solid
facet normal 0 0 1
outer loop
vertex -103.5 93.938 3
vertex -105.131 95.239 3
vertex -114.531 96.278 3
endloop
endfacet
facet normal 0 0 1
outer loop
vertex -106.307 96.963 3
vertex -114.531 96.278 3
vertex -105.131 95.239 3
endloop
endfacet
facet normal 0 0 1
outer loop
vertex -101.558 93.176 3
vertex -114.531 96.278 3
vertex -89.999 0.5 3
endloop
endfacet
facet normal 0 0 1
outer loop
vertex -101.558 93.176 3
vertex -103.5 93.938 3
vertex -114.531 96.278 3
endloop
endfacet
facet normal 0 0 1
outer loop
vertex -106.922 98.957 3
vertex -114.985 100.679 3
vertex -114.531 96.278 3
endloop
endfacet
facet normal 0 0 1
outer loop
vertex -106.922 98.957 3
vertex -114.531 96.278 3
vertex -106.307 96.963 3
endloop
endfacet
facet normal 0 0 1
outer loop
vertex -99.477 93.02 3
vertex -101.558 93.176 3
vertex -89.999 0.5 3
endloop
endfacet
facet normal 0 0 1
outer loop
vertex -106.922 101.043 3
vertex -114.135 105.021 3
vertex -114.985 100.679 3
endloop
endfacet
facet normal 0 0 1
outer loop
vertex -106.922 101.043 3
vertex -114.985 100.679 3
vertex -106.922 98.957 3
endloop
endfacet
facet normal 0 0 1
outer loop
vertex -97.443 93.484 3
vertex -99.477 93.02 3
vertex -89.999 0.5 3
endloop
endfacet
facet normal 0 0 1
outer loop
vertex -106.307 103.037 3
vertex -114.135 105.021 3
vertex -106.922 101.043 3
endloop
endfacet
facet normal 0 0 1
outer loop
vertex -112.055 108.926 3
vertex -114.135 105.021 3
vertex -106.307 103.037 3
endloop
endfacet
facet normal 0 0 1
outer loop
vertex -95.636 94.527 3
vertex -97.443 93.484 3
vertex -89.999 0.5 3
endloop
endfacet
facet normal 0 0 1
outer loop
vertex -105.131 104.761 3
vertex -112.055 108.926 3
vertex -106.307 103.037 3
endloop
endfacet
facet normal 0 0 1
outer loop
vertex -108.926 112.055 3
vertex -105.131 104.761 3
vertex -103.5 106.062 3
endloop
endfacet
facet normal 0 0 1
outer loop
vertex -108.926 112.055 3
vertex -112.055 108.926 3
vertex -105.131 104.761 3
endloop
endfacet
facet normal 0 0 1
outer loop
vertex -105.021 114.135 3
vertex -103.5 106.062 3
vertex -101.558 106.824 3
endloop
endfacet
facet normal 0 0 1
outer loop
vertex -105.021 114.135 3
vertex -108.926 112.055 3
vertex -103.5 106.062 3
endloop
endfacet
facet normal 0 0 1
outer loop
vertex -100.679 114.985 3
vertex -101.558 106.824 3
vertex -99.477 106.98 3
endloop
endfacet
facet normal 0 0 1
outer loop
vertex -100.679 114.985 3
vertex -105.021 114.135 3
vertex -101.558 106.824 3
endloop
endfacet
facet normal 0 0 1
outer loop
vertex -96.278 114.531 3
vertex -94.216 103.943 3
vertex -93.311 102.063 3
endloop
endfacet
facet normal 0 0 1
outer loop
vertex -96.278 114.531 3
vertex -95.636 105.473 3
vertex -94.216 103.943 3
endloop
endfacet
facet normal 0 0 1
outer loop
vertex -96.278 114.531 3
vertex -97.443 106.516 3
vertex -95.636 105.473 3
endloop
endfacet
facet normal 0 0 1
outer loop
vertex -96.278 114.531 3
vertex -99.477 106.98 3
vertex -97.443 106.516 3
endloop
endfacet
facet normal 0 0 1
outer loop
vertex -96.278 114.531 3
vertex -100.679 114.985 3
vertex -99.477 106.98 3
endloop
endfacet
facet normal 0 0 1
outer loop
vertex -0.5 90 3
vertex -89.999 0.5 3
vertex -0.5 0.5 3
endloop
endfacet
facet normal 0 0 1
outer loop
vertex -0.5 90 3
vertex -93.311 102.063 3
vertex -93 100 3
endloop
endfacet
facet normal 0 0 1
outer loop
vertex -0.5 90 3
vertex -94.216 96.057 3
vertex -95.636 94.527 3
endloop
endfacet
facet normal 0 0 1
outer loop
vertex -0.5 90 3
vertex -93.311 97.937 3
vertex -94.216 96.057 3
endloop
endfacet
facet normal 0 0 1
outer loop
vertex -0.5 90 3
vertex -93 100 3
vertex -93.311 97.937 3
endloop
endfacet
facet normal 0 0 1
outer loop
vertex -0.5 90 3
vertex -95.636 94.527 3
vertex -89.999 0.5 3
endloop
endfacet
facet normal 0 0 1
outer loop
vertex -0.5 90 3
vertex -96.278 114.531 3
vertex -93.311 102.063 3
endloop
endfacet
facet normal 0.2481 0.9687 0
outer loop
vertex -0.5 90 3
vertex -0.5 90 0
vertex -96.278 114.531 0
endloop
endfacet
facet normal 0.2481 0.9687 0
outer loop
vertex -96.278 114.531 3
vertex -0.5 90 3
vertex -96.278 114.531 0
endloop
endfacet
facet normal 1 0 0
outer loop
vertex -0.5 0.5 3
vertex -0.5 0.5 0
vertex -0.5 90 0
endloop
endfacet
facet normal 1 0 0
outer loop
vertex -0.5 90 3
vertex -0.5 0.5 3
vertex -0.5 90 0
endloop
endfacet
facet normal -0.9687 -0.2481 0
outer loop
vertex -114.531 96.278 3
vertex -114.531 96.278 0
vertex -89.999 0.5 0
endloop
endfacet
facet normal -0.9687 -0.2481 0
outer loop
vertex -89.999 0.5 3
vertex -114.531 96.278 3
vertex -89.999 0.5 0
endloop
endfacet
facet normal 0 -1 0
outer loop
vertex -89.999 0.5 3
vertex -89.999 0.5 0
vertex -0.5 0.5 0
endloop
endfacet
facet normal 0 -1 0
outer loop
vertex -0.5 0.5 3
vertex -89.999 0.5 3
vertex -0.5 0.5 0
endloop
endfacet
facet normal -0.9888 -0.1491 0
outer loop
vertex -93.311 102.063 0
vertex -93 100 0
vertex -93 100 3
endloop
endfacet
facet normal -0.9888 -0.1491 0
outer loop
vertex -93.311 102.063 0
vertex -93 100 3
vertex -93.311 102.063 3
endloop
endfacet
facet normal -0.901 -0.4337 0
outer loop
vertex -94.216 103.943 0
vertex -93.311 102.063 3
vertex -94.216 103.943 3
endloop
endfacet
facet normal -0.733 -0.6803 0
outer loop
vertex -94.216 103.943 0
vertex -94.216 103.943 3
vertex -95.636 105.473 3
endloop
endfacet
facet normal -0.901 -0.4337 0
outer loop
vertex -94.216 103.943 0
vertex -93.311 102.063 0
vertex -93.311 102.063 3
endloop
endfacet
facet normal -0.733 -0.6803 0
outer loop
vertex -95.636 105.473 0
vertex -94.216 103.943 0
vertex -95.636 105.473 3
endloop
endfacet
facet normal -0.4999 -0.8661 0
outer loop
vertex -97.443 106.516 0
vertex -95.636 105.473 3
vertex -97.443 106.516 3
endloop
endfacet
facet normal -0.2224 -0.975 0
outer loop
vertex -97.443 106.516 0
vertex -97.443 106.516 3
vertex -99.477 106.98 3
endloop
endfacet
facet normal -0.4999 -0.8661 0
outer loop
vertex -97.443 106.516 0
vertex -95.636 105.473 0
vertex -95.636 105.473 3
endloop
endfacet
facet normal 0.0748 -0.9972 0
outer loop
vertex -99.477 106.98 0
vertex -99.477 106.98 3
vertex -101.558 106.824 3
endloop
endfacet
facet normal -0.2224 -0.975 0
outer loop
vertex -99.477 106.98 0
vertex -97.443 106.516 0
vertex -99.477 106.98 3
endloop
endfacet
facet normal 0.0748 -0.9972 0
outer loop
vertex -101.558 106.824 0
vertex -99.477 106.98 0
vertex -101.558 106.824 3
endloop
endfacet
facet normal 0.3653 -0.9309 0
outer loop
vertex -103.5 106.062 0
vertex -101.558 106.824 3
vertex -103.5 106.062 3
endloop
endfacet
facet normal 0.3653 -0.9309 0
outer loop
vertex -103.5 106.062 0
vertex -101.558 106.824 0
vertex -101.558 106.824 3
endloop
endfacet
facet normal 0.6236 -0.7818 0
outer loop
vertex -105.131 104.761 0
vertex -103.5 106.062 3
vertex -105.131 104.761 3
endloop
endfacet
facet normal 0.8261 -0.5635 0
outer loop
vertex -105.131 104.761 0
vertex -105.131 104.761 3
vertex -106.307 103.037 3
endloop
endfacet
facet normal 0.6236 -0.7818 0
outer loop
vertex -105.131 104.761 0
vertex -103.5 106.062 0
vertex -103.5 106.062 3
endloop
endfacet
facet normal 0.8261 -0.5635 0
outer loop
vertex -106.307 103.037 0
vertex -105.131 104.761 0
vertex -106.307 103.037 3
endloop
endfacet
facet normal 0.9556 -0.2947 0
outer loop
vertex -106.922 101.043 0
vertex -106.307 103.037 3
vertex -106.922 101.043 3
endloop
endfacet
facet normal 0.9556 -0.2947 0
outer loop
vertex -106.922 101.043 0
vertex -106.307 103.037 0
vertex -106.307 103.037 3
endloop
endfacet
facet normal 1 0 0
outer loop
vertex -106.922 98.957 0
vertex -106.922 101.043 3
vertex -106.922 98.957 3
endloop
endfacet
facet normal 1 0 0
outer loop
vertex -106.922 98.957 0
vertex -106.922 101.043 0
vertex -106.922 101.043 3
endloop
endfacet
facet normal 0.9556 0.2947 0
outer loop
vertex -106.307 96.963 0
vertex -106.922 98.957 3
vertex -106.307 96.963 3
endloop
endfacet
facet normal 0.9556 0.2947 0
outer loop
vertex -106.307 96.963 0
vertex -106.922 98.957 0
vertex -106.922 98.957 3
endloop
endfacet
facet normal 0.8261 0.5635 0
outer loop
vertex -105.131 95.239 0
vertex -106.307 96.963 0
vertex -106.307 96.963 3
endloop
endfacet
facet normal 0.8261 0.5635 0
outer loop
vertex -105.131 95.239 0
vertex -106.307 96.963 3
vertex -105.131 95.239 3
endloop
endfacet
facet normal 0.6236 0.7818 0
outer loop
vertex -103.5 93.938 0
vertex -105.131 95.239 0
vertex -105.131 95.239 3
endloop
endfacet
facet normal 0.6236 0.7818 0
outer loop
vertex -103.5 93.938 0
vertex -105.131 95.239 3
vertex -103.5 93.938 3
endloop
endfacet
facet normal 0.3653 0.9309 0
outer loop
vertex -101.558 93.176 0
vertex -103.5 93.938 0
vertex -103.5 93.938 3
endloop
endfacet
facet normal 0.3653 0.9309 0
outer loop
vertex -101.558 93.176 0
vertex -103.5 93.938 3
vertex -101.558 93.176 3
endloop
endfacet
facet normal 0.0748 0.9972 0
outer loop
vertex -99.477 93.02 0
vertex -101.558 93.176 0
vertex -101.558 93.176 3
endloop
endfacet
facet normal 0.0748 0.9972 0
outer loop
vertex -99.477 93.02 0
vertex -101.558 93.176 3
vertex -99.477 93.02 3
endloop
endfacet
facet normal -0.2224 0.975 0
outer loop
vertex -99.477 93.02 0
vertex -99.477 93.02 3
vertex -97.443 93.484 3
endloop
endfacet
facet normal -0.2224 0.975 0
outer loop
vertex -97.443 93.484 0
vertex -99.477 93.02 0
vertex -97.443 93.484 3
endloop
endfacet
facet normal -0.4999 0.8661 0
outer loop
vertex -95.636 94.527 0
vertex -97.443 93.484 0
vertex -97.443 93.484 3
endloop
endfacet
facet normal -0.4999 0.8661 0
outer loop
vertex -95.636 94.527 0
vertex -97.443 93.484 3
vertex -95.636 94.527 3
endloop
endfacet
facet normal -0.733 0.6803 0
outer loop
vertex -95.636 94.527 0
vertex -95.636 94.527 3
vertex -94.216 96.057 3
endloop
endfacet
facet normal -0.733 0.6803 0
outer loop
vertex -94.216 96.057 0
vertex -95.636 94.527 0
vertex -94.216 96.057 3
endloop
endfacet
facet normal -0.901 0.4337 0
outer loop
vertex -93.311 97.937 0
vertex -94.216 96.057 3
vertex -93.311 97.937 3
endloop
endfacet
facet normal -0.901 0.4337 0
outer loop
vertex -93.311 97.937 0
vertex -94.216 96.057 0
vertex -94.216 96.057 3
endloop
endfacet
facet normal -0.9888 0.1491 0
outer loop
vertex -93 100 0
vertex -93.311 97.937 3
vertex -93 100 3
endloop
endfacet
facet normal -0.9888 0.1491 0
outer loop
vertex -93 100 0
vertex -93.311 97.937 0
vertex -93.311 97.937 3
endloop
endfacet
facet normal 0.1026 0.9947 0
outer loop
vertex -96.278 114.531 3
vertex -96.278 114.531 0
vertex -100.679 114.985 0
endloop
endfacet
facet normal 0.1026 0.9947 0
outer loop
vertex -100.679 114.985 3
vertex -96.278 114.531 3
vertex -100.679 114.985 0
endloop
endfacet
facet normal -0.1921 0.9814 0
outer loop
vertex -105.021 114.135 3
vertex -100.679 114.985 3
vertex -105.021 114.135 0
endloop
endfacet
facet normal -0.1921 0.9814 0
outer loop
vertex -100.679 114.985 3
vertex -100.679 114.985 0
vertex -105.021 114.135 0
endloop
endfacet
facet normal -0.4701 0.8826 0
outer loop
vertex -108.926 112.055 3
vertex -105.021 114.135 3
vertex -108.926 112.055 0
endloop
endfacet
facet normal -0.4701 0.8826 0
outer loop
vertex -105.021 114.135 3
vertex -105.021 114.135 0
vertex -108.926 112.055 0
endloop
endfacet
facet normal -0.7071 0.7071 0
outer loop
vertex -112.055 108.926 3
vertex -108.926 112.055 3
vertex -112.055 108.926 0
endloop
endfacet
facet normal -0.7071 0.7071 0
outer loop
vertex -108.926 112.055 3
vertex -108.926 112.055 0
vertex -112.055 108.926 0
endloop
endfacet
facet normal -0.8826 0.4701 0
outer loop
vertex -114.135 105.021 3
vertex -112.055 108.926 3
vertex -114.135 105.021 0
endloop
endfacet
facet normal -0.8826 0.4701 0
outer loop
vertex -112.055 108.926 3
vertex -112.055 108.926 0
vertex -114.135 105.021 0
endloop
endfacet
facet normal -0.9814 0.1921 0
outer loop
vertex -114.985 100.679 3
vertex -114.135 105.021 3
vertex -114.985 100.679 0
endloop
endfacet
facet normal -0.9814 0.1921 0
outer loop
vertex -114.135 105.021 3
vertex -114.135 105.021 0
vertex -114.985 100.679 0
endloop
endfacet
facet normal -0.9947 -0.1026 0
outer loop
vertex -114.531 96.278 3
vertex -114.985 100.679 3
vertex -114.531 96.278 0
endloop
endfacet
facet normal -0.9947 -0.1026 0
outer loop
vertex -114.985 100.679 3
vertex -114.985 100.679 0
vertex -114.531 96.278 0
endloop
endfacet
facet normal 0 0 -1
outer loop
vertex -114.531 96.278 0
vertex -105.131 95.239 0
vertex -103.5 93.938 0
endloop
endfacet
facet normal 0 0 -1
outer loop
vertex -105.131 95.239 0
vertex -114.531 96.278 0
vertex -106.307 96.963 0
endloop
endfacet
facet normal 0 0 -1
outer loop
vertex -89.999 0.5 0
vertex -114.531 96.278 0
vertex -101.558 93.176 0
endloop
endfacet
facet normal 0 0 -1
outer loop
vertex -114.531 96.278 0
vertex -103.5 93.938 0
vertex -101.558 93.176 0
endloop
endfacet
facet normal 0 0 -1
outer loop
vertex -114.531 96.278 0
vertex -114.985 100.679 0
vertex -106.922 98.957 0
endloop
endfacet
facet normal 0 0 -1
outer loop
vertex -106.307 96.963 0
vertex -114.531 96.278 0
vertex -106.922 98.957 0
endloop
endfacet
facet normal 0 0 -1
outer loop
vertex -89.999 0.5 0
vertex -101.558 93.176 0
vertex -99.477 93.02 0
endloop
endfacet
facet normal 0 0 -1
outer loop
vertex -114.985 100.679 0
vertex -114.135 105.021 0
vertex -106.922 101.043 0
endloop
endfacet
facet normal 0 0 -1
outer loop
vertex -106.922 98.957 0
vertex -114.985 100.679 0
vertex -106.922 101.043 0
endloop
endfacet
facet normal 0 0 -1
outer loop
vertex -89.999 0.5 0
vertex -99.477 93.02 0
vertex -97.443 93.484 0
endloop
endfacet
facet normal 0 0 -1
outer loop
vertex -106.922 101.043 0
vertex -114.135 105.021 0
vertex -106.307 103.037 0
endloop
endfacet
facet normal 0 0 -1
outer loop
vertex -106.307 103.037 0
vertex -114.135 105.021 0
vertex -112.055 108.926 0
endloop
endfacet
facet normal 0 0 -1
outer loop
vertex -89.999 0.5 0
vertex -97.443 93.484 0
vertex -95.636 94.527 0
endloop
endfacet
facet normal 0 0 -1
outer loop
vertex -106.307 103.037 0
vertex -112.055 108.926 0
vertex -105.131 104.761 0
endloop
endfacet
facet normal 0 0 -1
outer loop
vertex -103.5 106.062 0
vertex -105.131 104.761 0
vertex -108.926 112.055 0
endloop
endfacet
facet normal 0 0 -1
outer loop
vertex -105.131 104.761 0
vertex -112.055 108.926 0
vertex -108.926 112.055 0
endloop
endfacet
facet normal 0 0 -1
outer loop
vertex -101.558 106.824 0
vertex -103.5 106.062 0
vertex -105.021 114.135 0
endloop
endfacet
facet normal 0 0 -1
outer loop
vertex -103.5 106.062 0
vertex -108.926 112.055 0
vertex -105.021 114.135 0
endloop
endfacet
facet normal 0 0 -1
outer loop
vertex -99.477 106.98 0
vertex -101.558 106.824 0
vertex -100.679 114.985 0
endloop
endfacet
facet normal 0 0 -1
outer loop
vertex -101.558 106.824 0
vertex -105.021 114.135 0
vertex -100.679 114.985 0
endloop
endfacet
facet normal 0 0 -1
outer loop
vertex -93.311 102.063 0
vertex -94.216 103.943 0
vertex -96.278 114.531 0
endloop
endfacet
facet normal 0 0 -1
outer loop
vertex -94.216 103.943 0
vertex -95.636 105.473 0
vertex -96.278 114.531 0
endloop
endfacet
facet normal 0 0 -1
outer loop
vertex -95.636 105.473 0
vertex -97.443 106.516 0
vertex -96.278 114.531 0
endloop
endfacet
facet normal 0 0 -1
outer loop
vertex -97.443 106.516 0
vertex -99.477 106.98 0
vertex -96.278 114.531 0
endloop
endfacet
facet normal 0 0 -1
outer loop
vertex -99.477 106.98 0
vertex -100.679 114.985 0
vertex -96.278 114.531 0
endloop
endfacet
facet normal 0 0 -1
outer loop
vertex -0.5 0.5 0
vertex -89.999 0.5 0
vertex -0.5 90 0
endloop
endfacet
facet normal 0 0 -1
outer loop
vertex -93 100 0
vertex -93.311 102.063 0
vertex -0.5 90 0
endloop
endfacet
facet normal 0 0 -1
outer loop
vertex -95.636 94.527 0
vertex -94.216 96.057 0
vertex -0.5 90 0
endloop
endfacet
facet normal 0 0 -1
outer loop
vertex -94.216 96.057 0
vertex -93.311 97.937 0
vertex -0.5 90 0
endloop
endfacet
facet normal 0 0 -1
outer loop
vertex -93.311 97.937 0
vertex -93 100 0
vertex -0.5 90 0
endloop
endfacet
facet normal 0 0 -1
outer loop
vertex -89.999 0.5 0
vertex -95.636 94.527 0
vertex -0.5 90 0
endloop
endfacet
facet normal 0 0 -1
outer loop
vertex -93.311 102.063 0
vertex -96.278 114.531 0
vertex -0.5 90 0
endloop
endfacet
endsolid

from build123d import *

# Parameters (mm, degrees)
F1_R     = 7
F2_DEPTH = 3


with BuildPart() as f2:
    # F1 (on Top) → F2 (new body)
    with BuildSketch(Plane.XY):
        with BuildLine():
            ThreePointArc((-96.278295, 114.530964), (-88.15041, 109.197131), (-85, 100))
            ThreePointArc((-85, 100), (-98.124327, 85.117734), (-114.530913, 96.278097))
            Line((-114.530913, 96.278097), (-89.998611, 0.5))
            Line((-89.998611, 0.5), (-0.5, 0.5))
            Line((-0.5, 0.5), (-0.5, 90))
            Line((-0.5, 90), (-96.278295, 114.530964))
        make_face()
        with BuildLine():
            ThreePointArc((-114.530913, 96.278097), (-98.124327, 85.117734), (-85, 100))
            ThreePointArc((-85, 100), (-88.15041, 109.197131), (-96.278295, 114.530964))
            ThreePointArc((-96.278295, 114.530964), (-110.606674, 110.60653), (-114.530913, 96.278097))
        make_face()
        with Locations((-100, 100)):
            Circle(F1_R, mode=Mode.SUBTRACT)
    extrude(amount=F2_DEPTH)


solid = f2.part
